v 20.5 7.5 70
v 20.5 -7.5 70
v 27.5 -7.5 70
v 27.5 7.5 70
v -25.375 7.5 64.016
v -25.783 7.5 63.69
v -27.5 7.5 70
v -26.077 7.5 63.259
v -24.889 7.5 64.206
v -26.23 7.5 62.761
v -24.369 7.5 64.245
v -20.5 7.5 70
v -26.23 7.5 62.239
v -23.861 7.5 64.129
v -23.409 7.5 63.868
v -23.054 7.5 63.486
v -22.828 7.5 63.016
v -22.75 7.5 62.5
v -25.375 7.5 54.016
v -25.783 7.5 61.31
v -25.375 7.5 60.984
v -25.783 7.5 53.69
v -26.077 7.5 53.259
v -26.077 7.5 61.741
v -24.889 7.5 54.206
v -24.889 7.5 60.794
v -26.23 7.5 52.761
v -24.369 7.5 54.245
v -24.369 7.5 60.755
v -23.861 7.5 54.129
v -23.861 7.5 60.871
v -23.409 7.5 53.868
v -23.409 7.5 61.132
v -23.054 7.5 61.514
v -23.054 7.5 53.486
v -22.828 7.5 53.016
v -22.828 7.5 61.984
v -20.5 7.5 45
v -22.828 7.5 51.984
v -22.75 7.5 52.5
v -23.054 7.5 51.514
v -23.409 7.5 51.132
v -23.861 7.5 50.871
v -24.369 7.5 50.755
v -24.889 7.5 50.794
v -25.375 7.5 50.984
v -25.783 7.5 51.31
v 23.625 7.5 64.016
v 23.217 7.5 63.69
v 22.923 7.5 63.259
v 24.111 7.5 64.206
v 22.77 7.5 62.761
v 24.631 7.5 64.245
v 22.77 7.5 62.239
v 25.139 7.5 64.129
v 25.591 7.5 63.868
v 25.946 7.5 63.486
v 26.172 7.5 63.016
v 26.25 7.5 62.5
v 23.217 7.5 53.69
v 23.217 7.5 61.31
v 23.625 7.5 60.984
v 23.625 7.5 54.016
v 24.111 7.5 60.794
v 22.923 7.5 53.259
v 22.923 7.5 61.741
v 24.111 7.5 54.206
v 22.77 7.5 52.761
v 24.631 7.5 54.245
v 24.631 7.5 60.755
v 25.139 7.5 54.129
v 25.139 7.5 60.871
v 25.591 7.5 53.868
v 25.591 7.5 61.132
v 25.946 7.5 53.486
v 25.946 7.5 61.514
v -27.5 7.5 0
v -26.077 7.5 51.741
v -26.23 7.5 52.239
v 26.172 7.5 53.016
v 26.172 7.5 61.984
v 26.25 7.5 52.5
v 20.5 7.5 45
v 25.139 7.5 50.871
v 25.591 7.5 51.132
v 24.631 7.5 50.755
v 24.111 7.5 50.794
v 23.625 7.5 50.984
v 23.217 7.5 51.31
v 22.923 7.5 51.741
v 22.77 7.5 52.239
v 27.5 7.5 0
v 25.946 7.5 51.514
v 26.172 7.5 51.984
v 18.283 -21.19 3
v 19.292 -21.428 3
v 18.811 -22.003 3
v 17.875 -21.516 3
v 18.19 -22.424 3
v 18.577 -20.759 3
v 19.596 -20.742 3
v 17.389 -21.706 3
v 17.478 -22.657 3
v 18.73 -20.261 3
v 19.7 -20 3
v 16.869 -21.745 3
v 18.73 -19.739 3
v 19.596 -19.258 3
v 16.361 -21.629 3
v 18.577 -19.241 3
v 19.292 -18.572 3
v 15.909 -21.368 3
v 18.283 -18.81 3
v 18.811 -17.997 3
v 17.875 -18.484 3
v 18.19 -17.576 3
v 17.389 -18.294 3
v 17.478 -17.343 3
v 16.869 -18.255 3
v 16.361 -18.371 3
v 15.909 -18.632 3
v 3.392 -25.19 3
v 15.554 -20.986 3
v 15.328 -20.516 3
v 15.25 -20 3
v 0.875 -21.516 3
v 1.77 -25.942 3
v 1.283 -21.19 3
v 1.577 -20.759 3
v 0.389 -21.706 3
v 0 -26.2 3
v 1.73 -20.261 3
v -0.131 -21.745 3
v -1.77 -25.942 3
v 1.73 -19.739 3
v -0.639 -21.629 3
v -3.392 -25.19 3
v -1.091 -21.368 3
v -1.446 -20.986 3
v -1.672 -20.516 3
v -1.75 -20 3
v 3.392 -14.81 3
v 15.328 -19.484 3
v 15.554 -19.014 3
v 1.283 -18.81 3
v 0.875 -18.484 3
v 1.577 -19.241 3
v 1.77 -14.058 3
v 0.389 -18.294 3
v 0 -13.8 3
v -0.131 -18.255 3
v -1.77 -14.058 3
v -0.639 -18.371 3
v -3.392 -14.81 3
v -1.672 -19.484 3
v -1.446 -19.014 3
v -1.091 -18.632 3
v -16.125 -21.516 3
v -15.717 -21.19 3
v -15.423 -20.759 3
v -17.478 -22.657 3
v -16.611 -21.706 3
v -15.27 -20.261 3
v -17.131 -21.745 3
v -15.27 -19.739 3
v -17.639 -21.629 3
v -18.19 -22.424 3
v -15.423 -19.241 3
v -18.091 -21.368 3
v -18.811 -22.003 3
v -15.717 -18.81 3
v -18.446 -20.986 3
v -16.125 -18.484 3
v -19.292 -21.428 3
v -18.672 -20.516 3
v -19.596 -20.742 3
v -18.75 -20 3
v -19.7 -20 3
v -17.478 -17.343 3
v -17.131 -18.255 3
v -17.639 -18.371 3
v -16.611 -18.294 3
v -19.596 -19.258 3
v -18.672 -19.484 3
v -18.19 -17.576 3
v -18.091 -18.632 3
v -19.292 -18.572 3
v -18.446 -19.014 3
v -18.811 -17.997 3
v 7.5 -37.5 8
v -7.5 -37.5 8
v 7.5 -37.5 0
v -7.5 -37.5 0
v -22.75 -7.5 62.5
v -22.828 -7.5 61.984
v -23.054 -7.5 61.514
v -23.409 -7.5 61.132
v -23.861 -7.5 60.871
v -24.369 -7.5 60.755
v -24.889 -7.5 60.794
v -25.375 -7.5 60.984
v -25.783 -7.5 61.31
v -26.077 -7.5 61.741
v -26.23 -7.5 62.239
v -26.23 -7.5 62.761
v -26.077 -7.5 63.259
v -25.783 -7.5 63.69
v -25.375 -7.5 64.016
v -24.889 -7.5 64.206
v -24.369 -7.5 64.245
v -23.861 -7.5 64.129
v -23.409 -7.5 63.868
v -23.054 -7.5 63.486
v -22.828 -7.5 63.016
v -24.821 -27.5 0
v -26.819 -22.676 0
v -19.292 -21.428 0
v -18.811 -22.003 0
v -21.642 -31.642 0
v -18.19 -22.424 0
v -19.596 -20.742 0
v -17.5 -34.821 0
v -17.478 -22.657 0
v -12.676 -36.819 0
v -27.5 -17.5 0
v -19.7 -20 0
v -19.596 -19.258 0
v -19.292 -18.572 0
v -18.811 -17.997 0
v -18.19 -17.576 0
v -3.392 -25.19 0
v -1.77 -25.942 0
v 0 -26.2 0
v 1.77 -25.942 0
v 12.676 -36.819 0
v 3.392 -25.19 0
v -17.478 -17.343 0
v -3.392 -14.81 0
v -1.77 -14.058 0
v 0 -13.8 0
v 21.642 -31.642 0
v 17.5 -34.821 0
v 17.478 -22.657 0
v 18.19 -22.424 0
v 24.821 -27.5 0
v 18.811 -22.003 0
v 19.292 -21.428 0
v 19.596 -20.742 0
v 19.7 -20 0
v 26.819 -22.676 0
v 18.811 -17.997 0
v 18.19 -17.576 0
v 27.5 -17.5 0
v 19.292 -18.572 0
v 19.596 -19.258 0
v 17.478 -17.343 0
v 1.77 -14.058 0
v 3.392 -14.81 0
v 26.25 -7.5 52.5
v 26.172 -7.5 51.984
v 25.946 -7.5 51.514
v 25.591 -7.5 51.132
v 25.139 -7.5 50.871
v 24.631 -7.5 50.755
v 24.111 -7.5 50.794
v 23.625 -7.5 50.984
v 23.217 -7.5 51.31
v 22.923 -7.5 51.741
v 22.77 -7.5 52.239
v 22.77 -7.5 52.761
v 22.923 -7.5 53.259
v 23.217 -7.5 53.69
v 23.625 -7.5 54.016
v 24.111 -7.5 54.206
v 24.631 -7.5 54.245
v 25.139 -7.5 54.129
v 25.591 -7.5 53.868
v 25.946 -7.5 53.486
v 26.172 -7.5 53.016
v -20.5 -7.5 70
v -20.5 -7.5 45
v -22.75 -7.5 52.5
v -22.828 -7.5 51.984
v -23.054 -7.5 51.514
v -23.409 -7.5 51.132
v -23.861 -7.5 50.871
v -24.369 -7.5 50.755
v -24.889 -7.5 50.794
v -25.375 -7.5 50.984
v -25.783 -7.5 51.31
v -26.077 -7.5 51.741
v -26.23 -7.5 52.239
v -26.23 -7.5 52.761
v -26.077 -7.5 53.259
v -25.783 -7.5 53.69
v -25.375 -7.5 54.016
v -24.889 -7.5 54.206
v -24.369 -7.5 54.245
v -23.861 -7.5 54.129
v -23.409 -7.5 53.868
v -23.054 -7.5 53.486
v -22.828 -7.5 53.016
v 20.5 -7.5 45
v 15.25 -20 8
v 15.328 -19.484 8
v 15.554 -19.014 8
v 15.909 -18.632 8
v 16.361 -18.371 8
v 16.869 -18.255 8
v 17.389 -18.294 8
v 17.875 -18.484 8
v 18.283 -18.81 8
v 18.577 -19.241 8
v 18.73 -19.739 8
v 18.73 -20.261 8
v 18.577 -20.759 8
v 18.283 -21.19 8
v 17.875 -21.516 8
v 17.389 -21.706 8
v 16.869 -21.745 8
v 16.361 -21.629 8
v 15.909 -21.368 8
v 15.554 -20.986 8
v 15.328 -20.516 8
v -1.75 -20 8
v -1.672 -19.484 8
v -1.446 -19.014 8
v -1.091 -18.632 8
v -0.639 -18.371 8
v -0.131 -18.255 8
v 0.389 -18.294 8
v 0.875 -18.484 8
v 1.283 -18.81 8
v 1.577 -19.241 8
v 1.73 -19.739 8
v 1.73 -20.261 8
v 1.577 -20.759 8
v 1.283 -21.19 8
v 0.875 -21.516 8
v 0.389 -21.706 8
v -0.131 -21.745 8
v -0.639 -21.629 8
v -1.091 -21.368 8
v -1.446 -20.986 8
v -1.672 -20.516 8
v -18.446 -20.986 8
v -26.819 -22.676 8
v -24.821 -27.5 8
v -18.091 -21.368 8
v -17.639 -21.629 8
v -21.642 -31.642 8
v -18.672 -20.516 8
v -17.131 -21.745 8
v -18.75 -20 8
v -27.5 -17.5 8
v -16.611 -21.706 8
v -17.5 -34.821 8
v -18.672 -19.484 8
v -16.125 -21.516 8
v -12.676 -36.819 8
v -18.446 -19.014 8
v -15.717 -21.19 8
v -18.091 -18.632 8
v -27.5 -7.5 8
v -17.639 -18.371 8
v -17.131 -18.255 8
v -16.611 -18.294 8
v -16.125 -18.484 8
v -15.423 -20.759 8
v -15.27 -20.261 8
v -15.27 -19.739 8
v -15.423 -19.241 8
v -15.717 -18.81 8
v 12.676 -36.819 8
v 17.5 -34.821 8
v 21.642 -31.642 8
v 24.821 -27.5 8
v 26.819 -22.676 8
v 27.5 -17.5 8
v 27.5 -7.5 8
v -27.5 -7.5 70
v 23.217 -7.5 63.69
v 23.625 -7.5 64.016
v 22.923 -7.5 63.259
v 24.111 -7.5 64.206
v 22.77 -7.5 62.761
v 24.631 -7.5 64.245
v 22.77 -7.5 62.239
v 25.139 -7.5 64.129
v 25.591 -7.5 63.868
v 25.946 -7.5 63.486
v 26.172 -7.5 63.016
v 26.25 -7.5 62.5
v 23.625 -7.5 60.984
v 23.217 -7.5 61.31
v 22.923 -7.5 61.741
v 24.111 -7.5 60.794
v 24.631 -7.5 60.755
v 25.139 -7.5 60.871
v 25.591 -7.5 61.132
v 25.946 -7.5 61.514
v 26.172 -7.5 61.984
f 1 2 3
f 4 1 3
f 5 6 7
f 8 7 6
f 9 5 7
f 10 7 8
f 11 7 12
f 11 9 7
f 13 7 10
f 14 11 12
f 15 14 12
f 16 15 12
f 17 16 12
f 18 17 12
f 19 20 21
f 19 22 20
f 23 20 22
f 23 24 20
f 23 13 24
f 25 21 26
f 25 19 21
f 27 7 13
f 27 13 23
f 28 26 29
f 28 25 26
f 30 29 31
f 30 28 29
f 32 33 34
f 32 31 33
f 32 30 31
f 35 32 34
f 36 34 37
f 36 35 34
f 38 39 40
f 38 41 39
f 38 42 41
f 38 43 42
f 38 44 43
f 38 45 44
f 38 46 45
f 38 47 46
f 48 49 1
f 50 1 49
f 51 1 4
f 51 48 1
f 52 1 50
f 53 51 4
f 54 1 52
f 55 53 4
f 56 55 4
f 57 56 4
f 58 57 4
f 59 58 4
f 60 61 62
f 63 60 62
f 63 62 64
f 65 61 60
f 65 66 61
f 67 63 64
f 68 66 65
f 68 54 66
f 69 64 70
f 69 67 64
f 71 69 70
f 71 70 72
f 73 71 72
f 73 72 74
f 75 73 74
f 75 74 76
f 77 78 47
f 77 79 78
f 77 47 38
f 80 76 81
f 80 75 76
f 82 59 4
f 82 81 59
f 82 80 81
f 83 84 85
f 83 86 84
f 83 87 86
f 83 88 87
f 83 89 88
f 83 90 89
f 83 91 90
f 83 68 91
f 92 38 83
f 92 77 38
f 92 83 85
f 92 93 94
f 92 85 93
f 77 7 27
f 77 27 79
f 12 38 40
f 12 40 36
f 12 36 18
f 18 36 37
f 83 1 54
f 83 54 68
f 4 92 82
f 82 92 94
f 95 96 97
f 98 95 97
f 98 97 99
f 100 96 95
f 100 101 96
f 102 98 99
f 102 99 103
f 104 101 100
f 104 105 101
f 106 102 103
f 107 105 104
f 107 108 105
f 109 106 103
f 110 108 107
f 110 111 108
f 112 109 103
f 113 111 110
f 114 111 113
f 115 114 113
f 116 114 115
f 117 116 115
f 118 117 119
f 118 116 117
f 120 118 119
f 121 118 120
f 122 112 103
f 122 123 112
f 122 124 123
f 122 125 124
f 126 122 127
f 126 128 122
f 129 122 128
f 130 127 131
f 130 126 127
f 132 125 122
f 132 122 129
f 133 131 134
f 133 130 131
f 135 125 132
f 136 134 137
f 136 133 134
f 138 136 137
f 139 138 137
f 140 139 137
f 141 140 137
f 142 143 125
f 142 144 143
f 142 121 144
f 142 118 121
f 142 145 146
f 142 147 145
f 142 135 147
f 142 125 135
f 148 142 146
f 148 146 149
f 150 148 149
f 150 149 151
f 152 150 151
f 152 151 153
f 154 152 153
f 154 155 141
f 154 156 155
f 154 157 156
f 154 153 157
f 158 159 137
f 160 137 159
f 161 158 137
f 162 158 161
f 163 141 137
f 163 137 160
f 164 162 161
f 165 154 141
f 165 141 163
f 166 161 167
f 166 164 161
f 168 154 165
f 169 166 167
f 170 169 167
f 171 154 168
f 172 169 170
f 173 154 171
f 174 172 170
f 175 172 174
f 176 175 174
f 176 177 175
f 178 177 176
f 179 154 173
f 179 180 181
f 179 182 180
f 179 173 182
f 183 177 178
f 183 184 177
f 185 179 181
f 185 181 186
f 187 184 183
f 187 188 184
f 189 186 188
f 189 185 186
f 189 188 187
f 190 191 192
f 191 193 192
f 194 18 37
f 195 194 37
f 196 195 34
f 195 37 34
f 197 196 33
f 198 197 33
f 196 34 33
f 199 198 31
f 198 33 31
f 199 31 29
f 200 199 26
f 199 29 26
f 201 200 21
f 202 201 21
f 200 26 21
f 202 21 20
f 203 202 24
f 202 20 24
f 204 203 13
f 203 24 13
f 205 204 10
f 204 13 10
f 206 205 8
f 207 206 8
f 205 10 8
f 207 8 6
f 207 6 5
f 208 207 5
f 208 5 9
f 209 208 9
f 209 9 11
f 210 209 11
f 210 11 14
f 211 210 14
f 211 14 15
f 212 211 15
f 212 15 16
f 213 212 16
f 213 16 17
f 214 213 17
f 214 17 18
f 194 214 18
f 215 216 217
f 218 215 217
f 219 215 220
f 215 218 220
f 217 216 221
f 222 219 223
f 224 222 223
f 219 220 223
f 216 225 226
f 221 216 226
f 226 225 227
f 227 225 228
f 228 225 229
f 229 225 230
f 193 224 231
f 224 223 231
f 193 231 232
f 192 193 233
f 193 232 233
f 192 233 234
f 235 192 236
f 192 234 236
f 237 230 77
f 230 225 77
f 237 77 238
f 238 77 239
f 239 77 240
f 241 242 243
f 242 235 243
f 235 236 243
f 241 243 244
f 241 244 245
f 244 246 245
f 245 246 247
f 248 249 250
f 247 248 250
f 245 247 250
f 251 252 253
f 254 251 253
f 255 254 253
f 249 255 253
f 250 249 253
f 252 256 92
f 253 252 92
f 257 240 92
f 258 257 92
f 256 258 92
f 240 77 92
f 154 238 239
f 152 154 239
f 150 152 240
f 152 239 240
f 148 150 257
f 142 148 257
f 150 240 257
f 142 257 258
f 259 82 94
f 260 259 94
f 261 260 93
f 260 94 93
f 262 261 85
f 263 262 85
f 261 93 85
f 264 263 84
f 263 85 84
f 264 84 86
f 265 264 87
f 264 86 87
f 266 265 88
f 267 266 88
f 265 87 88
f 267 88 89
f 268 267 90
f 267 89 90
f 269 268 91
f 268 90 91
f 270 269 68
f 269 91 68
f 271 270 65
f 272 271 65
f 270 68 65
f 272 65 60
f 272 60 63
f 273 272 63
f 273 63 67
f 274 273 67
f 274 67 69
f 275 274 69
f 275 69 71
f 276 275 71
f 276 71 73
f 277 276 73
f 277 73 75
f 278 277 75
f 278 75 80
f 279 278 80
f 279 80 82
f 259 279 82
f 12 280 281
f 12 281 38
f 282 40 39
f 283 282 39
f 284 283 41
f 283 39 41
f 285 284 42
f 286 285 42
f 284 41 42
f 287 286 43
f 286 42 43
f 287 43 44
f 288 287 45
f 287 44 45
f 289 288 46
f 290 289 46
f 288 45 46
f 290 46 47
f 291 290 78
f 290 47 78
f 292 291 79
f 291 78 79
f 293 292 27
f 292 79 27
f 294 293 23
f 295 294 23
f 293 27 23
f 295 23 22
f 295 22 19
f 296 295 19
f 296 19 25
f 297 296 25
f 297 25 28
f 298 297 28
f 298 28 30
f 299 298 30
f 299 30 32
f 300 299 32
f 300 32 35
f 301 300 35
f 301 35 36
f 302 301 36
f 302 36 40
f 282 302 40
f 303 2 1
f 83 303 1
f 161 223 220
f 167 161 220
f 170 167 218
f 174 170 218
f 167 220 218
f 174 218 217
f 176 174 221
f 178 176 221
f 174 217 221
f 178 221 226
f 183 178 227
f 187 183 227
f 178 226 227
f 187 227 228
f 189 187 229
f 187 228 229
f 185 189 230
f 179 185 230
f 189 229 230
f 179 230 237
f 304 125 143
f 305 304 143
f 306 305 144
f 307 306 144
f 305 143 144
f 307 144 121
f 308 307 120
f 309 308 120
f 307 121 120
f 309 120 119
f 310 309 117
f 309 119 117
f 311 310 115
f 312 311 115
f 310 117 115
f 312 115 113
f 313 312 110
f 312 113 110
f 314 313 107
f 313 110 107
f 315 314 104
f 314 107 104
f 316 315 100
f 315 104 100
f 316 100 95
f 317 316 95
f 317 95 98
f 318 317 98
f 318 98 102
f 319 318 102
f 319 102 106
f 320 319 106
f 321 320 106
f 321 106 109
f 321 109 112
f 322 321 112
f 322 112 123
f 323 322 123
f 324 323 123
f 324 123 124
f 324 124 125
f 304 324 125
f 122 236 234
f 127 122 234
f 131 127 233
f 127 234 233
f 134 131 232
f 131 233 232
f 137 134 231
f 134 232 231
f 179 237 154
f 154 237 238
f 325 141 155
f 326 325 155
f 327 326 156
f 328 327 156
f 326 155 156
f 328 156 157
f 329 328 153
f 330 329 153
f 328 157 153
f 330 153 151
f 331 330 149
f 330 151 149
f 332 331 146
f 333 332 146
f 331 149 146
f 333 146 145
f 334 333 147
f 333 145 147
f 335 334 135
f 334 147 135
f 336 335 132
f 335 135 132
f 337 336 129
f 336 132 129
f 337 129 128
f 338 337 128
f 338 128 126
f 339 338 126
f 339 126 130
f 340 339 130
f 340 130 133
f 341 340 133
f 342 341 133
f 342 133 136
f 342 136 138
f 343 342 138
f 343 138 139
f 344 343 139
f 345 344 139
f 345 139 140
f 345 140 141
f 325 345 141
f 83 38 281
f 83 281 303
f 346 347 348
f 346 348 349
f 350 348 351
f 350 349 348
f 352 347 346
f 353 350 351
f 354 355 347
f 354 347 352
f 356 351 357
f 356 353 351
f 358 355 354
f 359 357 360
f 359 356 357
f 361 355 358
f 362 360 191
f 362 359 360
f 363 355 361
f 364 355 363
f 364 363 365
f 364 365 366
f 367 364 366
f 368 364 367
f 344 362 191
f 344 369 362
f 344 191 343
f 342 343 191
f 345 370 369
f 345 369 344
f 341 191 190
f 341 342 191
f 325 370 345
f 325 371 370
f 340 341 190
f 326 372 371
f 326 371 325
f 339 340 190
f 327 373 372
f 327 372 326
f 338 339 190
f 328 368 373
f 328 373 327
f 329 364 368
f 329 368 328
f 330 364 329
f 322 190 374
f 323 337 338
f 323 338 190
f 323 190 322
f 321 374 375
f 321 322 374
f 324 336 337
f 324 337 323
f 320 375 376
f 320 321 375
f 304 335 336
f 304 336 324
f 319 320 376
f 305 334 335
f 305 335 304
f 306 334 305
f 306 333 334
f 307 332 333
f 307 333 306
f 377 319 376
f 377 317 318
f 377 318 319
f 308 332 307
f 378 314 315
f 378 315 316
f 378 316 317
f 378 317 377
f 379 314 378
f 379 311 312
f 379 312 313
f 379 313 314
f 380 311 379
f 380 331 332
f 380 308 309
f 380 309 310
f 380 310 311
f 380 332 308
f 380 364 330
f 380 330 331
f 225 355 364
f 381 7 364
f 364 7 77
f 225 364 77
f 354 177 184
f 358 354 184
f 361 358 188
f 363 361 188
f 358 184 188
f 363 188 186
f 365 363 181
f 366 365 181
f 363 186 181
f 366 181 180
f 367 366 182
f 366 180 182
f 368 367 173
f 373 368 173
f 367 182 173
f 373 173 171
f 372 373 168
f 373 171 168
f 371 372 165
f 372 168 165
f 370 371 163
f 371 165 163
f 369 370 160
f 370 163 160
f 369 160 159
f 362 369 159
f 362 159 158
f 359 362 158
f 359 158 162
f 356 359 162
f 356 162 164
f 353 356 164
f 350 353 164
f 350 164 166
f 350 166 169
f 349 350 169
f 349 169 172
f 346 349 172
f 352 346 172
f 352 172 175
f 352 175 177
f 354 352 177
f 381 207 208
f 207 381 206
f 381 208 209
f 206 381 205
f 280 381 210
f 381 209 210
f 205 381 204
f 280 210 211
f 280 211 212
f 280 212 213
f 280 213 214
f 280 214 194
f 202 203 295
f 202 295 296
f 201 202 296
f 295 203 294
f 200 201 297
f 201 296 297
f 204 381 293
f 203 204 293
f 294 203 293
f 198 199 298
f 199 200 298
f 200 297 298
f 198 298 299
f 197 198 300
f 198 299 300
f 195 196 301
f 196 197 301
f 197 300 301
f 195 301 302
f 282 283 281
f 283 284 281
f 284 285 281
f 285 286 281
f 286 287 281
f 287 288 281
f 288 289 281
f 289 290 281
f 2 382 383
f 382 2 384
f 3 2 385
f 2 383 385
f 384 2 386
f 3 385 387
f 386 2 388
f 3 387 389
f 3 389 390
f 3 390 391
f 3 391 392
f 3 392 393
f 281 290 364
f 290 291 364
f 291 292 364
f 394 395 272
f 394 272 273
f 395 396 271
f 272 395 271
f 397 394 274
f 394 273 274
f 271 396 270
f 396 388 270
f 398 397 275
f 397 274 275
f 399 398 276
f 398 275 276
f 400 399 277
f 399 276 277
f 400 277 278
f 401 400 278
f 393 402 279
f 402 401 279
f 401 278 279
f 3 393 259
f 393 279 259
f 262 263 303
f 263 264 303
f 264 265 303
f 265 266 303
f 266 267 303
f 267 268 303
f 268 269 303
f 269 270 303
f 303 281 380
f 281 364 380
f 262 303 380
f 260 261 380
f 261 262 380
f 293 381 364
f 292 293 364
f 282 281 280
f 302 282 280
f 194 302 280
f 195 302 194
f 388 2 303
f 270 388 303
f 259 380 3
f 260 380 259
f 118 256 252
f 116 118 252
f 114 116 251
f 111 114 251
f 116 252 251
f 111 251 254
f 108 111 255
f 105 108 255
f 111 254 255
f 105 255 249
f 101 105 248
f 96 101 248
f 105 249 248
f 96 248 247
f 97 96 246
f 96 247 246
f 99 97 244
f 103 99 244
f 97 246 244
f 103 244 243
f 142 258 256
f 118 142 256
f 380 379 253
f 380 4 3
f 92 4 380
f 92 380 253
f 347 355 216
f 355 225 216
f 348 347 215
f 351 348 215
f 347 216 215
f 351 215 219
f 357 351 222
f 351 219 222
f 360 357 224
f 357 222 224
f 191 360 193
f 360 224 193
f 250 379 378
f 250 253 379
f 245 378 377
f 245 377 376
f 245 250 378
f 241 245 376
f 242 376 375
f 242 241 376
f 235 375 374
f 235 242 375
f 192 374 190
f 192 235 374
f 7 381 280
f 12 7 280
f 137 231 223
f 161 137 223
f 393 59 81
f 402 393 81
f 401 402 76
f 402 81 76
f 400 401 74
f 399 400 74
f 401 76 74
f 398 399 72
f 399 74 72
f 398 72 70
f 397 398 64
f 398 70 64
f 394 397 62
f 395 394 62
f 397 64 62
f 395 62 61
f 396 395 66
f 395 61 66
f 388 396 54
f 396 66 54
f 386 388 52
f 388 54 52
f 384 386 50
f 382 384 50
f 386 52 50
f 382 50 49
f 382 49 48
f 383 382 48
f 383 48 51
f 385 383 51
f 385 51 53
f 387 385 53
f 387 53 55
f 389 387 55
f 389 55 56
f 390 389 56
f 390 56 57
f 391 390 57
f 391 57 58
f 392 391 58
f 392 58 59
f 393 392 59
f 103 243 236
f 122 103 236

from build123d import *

# Parameters (mm, degrees)
SKETCH1_W           = 55
SKETCH1_H           = 15
BOSS_EXTRUDE1_DEPTH = 70
SKETCH2_W           = 41
SKETCH2_H           = 15
CUT_EXTRUDE1_DEPTH  = 25
SKETCH3_R           = 1.75
CUT_EXTRUDE2_DEPTH  = 16
SKETCH4_W           = 55
SKETCH4_H           = 8
BOSS_EXTRUDE2_DEPTH = 30
FILLET1_R           = 20
CUT_EXTRUDE3_DEPTH  = 3
SKETCH6_R           = 1.75
CUT_EXTRUDE4_DEPTH  = 68


with BuildPart() as part:
    # Sketch1 → Boss-Extrude1 (new body)
    with BuildSketch(Plane.XY):
        Rectangle(SKETCH1_W, SKETCH1_H)
    extrude(amount=BOSS_EXTRUDE1_DEPTH)

    # Sketch2 → Cut-Extrude1 (cut)
    with BuildSketch(Plane.XY.offset(70)):
        Rectangle(SKETCH2_W, SKETCH2_H)
    extrude(amount=-CUT_EXTRUDE1_DEPTH, mode=Mode.SUBTRACT)

    # Sketch3 → Cut-Extrude2 (cut, through all)
    with BuildSketch(Plane(origin=(0, 7.5, 0), x_dir=(1, 0, 0), z_dir=(0, 1, 0))):
        with Locations((-24.5, -62.5)):
            Circle(SKETCH3_R)
        with Locations((24.5, -62.5)):
            Circle(SKETCH3_R)
        with Locations((-24.5, -52.5)):
            Circle(SKETCH3_R)
        with Locations((24.5, -52.5)):
            Circle(SKETCH3_R)
    extrude(amount=-CUT_EXTRUDE2_DEPTH, mode=Mode.SUBTRACT)

    # Sketch4 → Boss-Extrude2 (add)
    with BuildSketch(Plane(origin=(0, -7.5, 0), x_dir=(1, 0, 0), z_dir=(0, 1, 0))):
        with Locations((0, -4)):
            Rectangle(SKETCH4_W, SKETCH4_H)
    extrude(amount=-BOSS_EXTRUDE2_DEPTH)

    # Fillet1
    fillet1_edges = [part.edges().sort_by_distance(p)[0] for p in [
        (-27.5, -37.5, 4),
        (27.5, -37.5, 4),
    ]]
    fillet(fillet1_edges, radius=FILLET1_R)

    # Sketch5 → Cut-Extrude3 (cut)
    with BuildSketch(Plane(origin=(0, 0, 0), x_dir=(-1, 0, 0), z_dir=(0, 0, -1))):
        with BuildLine():
            Line((-17.477732777, -22.657399367), (-3.39236806, -25.189589478))
            ThreePointArc((-3.39236806, -25.189589478), (0, -26.2), (3.39236806, -25.189589478))
            Line((3.39236806, -25.189589478), (17.477732777, -22.657399367))
            ThreePointArc((17.477732777, -22.657399367), (19.7, -20), (17.477732777, -17.342600633))
            Line((17.477732777, -17.342600633), (3.39236806, -14.810410522))
            ThreePointArc((3.39236806, -14.810410522), (0, -13.8), (-3.39236806, -14.810410522))
            Line((-3.39236806, -14.810410522), (-17.477732777, -17.342600633))
            ThreePointArc((-17.477732777, -17.342600633), (-19.7, -20), (-17.477732777, -22.657399367))
        make_face()
    extrude(amount=-CUT_EXTRUDE3_DEPTH, mode=Mode.SUBTRACT)

    # Sketch6 → Cut-Extrude4 (cut, through all)
    with BuildSketch(Plane(origin=(0, 0, 3), x_dir=(-1, 0, 0), z_dir=(0, 0, -1))):
        with Locations((0, -20)):
            Circle(SKETCH6_R)
        with Locations((17, -20)):
            Circle(SKETCH6_R)
        with Locations((-17, -20)):
            Circle(SKETCH6_R)
    extrude(amount=-CUT_EXTRUDE4_DEPTH, mode=Mode.SUBTRACT)


solid = part.part
